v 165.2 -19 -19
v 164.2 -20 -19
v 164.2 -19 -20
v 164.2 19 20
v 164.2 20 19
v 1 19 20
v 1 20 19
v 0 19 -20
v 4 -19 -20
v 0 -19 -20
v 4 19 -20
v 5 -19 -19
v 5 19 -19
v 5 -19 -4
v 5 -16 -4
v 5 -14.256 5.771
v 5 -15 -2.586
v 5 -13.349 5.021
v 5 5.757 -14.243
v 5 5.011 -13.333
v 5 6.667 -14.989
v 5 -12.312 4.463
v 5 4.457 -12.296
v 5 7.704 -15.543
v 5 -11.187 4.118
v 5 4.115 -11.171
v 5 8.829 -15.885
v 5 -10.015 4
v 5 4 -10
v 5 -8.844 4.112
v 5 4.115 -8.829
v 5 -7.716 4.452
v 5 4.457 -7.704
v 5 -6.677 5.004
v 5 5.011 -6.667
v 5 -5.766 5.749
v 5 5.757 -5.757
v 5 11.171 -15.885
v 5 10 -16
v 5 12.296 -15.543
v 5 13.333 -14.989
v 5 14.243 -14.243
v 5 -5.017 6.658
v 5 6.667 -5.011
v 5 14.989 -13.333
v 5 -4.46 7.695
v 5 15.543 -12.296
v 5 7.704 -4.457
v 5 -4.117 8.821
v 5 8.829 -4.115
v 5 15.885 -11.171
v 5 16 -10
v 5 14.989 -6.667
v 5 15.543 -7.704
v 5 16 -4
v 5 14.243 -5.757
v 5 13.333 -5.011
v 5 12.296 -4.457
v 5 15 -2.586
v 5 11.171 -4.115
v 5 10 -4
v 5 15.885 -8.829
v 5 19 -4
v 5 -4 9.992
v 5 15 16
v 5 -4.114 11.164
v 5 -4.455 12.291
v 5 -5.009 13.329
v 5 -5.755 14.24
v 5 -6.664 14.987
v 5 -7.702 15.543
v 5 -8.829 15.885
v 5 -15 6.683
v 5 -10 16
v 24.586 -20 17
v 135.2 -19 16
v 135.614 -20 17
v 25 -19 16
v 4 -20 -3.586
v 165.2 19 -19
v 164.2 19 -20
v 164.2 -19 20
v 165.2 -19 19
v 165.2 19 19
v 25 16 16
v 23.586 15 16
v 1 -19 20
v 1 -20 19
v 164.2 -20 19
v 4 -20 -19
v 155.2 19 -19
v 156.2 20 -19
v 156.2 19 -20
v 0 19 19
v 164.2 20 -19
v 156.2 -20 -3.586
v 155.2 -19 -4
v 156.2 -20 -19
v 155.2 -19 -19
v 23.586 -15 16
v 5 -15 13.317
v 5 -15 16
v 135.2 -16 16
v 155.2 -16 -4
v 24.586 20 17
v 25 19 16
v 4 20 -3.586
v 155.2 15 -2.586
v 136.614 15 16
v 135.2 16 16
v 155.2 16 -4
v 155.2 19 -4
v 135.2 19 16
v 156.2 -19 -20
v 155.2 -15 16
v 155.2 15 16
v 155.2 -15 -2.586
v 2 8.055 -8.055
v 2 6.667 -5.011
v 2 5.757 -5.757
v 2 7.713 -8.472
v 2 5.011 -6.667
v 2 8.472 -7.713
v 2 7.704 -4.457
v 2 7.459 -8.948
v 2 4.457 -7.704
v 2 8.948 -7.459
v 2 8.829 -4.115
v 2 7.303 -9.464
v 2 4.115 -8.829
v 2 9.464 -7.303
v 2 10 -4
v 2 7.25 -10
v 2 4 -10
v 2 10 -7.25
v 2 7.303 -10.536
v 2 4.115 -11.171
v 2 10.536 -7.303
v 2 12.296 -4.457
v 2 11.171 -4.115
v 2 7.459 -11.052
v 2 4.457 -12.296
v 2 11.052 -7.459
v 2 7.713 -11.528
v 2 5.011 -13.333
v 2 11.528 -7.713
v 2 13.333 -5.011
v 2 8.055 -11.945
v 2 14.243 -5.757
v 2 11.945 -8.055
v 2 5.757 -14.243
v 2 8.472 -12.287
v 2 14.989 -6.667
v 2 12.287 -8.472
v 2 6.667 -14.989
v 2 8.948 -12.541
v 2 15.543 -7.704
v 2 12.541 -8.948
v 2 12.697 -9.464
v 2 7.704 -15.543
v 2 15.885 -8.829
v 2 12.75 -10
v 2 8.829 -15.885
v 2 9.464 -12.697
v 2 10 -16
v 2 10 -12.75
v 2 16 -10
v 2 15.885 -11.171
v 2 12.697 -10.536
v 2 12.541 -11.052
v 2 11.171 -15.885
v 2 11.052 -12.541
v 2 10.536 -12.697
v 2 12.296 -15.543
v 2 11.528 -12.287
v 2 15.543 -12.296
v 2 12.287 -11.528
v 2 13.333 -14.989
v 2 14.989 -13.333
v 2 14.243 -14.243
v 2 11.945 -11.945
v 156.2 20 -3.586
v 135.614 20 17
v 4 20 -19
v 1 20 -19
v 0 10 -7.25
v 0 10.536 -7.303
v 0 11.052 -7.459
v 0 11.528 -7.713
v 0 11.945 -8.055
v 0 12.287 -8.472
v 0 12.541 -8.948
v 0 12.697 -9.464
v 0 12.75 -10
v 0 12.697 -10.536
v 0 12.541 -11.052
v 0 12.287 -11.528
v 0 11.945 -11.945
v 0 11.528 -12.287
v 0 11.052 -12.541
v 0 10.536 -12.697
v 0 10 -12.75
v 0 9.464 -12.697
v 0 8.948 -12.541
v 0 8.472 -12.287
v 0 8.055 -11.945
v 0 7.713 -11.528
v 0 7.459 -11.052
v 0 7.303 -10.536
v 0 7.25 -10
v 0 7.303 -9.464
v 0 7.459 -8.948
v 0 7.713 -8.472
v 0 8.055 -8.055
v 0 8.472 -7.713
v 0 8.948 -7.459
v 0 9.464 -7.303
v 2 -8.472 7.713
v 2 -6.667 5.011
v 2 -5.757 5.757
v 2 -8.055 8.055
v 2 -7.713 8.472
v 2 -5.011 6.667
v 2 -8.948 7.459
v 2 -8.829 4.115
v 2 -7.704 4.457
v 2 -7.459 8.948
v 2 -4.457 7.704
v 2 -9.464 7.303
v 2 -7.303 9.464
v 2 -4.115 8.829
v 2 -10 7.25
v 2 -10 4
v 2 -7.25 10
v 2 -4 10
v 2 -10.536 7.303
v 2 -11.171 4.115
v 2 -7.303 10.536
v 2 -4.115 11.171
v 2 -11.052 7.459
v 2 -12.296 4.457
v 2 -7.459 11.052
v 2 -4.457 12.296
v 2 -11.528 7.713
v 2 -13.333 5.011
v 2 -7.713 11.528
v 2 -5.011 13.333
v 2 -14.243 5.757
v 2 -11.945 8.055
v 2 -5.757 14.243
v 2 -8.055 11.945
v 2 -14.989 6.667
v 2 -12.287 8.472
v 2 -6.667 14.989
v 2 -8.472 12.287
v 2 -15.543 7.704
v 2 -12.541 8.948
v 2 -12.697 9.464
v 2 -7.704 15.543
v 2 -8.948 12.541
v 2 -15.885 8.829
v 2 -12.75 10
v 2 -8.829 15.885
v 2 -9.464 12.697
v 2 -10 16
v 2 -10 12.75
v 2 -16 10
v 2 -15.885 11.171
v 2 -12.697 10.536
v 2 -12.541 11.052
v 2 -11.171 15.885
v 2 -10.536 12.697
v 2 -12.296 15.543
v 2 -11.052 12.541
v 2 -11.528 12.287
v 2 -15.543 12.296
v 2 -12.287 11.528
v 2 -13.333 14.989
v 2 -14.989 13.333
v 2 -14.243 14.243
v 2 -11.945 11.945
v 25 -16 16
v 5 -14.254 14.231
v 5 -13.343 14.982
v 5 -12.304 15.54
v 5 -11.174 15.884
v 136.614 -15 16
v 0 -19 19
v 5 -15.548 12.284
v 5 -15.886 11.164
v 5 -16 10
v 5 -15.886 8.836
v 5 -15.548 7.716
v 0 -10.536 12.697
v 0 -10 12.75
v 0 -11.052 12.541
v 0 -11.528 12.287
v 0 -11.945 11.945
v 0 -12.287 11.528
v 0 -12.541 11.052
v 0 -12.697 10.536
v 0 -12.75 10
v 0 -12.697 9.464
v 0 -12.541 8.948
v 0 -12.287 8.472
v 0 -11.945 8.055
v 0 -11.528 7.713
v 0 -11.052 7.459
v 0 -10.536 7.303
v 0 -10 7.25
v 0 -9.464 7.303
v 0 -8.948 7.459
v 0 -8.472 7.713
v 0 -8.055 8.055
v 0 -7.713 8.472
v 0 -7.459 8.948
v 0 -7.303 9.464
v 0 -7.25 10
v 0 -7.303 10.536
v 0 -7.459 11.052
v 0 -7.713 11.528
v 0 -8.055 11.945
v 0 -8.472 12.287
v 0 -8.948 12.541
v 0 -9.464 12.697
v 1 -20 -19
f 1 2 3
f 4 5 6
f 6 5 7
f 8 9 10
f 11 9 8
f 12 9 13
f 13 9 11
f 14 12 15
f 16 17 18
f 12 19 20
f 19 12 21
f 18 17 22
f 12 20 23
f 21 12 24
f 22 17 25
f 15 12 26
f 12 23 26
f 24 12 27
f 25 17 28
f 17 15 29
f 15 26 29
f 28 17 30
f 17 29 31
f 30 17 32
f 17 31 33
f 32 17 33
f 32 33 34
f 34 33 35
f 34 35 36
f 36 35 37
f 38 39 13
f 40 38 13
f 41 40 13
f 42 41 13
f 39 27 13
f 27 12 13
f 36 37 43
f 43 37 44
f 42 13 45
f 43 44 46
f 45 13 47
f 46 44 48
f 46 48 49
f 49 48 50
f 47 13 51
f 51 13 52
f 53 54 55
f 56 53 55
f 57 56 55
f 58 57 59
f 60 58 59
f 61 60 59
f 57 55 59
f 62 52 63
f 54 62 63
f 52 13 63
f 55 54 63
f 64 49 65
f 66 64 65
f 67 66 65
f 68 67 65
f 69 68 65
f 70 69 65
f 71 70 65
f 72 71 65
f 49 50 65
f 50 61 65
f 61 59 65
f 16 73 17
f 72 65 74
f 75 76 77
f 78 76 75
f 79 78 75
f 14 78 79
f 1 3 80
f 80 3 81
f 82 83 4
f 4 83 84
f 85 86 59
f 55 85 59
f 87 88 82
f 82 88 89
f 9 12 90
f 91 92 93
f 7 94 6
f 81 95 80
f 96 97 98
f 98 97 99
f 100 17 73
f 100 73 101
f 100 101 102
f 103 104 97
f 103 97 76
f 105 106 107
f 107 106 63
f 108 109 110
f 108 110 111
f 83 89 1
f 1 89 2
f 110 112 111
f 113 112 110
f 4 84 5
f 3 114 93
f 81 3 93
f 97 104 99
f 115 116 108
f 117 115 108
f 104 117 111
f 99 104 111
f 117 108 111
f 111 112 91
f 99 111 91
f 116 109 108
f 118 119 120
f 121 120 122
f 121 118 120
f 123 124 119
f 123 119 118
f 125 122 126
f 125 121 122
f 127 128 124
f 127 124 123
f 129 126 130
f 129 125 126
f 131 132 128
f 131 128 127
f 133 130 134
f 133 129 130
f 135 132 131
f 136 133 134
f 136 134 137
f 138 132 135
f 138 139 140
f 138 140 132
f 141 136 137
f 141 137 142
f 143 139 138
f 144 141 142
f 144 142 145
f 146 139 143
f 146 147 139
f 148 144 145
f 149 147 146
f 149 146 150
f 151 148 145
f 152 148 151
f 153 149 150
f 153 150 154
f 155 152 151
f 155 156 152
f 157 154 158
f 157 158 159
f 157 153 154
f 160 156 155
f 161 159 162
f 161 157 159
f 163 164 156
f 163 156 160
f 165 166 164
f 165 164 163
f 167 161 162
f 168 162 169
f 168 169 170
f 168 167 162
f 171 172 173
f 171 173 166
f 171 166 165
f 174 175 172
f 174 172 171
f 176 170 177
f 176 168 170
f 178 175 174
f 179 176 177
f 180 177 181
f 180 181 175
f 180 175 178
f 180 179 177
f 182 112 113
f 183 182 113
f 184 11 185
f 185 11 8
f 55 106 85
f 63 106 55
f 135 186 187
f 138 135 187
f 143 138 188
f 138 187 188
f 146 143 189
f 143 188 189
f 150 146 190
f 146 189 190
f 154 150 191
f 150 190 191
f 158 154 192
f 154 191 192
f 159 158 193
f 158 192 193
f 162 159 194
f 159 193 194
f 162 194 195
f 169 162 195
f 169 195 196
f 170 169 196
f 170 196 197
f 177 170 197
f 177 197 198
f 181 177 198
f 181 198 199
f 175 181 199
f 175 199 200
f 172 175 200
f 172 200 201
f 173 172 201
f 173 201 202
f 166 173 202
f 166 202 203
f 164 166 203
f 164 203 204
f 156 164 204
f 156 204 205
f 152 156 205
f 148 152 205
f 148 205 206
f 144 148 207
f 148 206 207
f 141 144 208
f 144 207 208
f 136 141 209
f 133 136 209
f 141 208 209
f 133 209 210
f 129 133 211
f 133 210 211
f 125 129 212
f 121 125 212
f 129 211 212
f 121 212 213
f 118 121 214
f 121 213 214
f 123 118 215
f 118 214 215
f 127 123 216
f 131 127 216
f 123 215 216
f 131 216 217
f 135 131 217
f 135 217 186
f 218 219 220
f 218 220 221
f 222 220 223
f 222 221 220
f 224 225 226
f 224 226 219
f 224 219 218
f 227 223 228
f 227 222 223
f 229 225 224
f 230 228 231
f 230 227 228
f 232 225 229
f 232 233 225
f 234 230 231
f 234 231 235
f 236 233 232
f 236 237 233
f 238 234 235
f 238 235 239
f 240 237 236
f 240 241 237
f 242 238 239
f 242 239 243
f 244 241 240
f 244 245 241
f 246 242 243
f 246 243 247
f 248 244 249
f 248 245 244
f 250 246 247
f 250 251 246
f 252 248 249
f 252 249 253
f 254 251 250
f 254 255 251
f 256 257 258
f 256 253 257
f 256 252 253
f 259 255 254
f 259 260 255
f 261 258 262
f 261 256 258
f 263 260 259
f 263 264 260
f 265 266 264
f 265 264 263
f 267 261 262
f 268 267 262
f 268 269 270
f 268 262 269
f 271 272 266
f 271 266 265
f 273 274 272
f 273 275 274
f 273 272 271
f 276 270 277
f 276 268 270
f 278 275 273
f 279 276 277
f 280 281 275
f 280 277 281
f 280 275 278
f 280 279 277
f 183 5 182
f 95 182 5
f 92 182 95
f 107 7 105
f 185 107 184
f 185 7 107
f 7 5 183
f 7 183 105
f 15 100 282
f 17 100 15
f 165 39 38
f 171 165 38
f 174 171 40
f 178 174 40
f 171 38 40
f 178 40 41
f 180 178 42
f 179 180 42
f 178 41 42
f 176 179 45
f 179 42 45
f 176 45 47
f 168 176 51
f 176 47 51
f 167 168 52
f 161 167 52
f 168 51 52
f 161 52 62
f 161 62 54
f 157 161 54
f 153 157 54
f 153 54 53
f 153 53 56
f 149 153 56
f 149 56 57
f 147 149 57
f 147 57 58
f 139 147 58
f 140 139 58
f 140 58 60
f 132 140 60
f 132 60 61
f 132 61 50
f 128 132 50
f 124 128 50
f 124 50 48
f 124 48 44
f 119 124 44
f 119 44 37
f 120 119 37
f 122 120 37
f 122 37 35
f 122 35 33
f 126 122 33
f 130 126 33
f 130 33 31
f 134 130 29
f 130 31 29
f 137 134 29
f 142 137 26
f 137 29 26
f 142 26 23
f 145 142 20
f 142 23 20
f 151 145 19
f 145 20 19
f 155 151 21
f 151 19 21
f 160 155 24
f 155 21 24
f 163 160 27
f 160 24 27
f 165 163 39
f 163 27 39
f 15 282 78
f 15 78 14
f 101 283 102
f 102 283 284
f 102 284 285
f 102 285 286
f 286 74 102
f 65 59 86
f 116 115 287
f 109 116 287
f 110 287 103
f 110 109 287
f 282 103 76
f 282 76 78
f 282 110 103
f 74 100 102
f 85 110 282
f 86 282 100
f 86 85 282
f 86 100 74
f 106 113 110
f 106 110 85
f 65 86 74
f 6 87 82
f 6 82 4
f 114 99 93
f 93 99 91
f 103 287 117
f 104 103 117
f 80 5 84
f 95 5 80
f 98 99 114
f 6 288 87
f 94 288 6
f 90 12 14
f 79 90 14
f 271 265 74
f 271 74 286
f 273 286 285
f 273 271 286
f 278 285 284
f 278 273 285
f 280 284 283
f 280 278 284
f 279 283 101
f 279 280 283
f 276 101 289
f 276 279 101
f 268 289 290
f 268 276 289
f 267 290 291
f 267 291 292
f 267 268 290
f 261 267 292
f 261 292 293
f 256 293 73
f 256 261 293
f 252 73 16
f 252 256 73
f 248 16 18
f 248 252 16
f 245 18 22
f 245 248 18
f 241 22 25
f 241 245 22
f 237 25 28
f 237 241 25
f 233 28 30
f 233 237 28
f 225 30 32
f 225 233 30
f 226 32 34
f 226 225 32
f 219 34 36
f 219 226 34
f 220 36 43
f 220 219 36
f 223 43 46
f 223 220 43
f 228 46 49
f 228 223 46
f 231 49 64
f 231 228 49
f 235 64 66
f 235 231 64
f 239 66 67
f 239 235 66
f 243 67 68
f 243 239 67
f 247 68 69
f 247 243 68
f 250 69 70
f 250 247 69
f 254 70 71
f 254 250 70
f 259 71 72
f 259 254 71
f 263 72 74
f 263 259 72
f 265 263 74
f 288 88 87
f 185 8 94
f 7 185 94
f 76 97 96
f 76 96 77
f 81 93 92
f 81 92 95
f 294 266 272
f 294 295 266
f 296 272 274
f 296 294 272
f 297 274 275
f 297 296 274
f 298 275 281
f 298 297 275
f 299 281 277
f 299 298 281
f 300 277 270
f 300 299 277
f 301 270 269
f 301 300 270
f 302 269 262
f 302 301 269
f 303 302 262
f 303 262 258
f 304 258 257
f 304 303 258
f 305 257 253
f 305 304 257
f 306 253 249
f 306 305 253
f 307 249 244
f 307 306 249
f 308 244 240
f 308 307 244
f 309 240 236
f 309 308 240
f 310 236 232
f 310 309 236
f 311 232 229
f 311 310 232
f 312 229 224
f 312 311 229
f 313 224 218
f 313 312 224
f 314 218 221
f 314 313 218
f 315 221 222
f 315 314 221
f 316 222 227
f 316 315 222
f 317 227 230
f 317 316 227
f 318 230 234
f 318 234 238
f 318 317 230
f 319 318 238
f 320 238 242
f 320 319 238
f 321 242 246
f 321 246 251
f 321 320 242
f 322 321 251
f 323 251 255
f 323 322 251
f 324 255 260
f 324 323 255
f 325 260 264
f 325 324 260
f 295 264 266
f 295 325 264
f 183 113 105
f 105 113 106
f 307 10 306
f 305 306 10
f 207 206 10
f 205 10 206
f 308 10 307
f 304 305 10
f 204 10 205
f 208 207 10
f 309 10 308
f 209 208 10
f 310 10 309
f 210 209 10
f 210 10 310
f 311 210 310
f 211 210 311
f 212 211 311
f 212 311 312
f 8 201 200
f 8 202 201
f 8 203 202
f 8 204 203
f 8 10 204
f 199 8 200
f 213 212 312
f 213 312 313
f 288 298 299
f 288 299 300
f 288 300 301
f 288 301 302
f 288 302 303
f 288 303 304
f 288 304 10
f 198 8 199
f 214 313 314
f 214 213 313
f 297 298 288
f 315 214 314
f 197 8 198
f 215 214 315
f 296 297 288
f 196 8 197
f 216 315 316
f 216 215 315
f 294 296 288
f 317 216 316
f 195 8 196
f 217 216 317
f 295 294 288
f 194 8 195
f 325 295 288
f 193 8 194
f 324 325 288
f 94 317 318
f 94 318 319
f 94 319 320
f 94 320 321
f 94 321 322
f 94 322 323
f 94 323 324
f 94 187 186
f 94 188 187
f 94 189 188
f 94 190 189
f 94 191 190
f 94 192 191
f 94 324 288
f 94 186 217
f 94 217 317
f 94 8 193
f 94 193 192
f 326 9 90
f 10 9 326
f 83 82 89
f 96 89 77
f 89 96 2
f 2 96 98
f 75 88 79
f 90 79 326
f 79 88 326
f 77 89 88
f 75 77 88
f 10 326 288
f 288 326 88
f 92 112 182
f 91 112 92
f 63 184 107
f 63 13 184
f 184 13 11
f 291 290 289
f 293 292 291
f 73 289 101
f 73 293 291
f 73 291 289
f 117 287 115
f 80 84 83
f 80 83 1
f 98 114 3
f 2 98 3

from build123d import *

# Parameters (mm, degrees)
BOSS_EXTRUDE1_DEPTH                     = 40
SKETCH2_W                               = 40
SKETCH2_H                               = 40
BOSS_EXTRUDE2_DEPTH                     = 5
SKETCH3_W                               = 40
SKETCH3_H                               = 40
BOSS_EXTRUDE3_DEPTH                     = 10
CUT_EXTRUDE1_DEPTH                      = 30
CUT_EXTRUDE2_DEPTH                      = 30
CBORE_FOR_M5_HEX_HEAD_BOLT1_D           = 5.5
CBORE_FOR_M5_HEX_HEAD_BOLT1_DEPTH       = 5
CBORE_FOR_M5_HEX_HEAD_BOLT1_CBORE_D     = 12
CBORE_FOR_M5_HEX_HEAD_BOLT1_CBORE_DEPTH = 3
CHAMFER1_SIZE                           = 1


with BuildPart() as part:
    # Sketch1 → Boss-Extrude1 (new body)
    with BuildSketch(Plane(origin=(0, 20, 0), x_dir=(1, 0, 0), z_dir=(0, 1, 0))):
        Polygon((5, 4), (5, -20), (155.2, -20), (155.2, 4), (135.2, -16), (25, -16), align=None)
    extrude(amount=-BOSS_EXTRUDE1_DEPTH)

    # Sketch2 → Boss-Extrude2 (add)
    with BuildSketch(Plane.ZY.offset(-5)):
        Rectangle(SKETCH2_W, SKETCH2_H)
    extrude(amount=BOSS_EXTRUDE2_DEPTH)

    # Sketch3 → Boss-Extrude3 (add)
    with BuildSketch(Plane(origin=(155.2, 0, 0), x_dir=(0, 0, -1), z_dir=(1, 0, 0))):
        Rectangle(SKETCH3_W, SKETCH3_H)
    extrude(amount=BOSS_EXTRUDE3_DEPTH)

    # Sketch4 → Cut-Extrude1 (cut)
    with BuildSketch(Plane.XZ.offset(15)):
        Polygon((155.2, -4), (155.2, 16), (135.2, 16), align=None)
    extrude(amount=-CUT_EXTRUDE1_DEPTH, mode=Mode.SUBTRACT)

    # Sketch5 → Cut-Extrude2 (cut)
    with BuildSketch(Plane(origin=(0, 15, 0), x_dir=(1, 0, 0), z_dir=(0, 1, 0))):
        Polygon((5, 4), (5, -16), (25, -16), align=None)
    extrude(amount=-CUT_EXTRUDE2_DEPTH, mode=Mode.SUBTRACT)

    # Sketch6 → CBORE for M10 Hex Head Bolt1 (revolve, cut)
    with BuildSketch(Plane(origin=(0, -10, 10), x_dir=(0, 0, 1), z_dir=(0, 1, 0))):
        Polygon((0, 0), (0, 5), (6, 5), (6, 2), (2.75, 2), (2.75, 0), align=None)
    revolve(axis=Axis((-6.35, -10, 10), (1, 0, 0)), mode=Mode.SUBTRACT)

    # CBORE for M5 Hex Head Bolt1
    with Locations(Plane(origin=(5, 0, 0), x_dir=(0, 0, -1), z_dir=(1, 0, 0))):
        with Locations((10, 10)):
            CounterBoreHole(CBORE_FOR_M5_HEX_HEAD_BOLT1_D / 2, CBORE_FOR_M5_HEX_HEAD_BOLT1_CBORE_D / 2, CBORE_FOR_M5_HEX_HEAD_BOLT1_CBORE_DEPTH, depth=CBORE_FOR_M5_HEX_HEAD_BOLT1_DEPTH)

    # Chamfer1
    chamfer1_edges = [part.edges().sort_by_distance(p)[0] for p in [
        (82.6, -20, 20),
        (5, 20, -12),
        (5, 0, -20),
        (2.5, 20, -20),
        (5, -20, -12),
        (145.2, -20, 6),
        (2.5, -20, -20),
        (0, 20, 0),
        (0, -20, 0),
        (0, 0, 20),
        (80.1, -20, 16),
        (155.2, 20, -12),
        (160.2, 20, -20),
        (155.2, -20, -12),
        (155.2, 0, -20),
        (160.2, -20, -20),
        (165.2, 20, 0),
        (165.2, 0, 20),
        (165.2, -20, 0),
        (165.2, 0, -20),
        (145.2, 15, 6),
        (145.2, -15, 6),
        (15, -20, 6),
        (15, -15, 6),
        (15, 15, 6),
        (80.1, 20, 16),
        (145.2, 20, 6),
        (82.6, 20, 20),
        (15, 20, 6),
    ]]
    chamfer(chamfer1_edges, length=CHAMFER1_SIZE)


solid = part.part
